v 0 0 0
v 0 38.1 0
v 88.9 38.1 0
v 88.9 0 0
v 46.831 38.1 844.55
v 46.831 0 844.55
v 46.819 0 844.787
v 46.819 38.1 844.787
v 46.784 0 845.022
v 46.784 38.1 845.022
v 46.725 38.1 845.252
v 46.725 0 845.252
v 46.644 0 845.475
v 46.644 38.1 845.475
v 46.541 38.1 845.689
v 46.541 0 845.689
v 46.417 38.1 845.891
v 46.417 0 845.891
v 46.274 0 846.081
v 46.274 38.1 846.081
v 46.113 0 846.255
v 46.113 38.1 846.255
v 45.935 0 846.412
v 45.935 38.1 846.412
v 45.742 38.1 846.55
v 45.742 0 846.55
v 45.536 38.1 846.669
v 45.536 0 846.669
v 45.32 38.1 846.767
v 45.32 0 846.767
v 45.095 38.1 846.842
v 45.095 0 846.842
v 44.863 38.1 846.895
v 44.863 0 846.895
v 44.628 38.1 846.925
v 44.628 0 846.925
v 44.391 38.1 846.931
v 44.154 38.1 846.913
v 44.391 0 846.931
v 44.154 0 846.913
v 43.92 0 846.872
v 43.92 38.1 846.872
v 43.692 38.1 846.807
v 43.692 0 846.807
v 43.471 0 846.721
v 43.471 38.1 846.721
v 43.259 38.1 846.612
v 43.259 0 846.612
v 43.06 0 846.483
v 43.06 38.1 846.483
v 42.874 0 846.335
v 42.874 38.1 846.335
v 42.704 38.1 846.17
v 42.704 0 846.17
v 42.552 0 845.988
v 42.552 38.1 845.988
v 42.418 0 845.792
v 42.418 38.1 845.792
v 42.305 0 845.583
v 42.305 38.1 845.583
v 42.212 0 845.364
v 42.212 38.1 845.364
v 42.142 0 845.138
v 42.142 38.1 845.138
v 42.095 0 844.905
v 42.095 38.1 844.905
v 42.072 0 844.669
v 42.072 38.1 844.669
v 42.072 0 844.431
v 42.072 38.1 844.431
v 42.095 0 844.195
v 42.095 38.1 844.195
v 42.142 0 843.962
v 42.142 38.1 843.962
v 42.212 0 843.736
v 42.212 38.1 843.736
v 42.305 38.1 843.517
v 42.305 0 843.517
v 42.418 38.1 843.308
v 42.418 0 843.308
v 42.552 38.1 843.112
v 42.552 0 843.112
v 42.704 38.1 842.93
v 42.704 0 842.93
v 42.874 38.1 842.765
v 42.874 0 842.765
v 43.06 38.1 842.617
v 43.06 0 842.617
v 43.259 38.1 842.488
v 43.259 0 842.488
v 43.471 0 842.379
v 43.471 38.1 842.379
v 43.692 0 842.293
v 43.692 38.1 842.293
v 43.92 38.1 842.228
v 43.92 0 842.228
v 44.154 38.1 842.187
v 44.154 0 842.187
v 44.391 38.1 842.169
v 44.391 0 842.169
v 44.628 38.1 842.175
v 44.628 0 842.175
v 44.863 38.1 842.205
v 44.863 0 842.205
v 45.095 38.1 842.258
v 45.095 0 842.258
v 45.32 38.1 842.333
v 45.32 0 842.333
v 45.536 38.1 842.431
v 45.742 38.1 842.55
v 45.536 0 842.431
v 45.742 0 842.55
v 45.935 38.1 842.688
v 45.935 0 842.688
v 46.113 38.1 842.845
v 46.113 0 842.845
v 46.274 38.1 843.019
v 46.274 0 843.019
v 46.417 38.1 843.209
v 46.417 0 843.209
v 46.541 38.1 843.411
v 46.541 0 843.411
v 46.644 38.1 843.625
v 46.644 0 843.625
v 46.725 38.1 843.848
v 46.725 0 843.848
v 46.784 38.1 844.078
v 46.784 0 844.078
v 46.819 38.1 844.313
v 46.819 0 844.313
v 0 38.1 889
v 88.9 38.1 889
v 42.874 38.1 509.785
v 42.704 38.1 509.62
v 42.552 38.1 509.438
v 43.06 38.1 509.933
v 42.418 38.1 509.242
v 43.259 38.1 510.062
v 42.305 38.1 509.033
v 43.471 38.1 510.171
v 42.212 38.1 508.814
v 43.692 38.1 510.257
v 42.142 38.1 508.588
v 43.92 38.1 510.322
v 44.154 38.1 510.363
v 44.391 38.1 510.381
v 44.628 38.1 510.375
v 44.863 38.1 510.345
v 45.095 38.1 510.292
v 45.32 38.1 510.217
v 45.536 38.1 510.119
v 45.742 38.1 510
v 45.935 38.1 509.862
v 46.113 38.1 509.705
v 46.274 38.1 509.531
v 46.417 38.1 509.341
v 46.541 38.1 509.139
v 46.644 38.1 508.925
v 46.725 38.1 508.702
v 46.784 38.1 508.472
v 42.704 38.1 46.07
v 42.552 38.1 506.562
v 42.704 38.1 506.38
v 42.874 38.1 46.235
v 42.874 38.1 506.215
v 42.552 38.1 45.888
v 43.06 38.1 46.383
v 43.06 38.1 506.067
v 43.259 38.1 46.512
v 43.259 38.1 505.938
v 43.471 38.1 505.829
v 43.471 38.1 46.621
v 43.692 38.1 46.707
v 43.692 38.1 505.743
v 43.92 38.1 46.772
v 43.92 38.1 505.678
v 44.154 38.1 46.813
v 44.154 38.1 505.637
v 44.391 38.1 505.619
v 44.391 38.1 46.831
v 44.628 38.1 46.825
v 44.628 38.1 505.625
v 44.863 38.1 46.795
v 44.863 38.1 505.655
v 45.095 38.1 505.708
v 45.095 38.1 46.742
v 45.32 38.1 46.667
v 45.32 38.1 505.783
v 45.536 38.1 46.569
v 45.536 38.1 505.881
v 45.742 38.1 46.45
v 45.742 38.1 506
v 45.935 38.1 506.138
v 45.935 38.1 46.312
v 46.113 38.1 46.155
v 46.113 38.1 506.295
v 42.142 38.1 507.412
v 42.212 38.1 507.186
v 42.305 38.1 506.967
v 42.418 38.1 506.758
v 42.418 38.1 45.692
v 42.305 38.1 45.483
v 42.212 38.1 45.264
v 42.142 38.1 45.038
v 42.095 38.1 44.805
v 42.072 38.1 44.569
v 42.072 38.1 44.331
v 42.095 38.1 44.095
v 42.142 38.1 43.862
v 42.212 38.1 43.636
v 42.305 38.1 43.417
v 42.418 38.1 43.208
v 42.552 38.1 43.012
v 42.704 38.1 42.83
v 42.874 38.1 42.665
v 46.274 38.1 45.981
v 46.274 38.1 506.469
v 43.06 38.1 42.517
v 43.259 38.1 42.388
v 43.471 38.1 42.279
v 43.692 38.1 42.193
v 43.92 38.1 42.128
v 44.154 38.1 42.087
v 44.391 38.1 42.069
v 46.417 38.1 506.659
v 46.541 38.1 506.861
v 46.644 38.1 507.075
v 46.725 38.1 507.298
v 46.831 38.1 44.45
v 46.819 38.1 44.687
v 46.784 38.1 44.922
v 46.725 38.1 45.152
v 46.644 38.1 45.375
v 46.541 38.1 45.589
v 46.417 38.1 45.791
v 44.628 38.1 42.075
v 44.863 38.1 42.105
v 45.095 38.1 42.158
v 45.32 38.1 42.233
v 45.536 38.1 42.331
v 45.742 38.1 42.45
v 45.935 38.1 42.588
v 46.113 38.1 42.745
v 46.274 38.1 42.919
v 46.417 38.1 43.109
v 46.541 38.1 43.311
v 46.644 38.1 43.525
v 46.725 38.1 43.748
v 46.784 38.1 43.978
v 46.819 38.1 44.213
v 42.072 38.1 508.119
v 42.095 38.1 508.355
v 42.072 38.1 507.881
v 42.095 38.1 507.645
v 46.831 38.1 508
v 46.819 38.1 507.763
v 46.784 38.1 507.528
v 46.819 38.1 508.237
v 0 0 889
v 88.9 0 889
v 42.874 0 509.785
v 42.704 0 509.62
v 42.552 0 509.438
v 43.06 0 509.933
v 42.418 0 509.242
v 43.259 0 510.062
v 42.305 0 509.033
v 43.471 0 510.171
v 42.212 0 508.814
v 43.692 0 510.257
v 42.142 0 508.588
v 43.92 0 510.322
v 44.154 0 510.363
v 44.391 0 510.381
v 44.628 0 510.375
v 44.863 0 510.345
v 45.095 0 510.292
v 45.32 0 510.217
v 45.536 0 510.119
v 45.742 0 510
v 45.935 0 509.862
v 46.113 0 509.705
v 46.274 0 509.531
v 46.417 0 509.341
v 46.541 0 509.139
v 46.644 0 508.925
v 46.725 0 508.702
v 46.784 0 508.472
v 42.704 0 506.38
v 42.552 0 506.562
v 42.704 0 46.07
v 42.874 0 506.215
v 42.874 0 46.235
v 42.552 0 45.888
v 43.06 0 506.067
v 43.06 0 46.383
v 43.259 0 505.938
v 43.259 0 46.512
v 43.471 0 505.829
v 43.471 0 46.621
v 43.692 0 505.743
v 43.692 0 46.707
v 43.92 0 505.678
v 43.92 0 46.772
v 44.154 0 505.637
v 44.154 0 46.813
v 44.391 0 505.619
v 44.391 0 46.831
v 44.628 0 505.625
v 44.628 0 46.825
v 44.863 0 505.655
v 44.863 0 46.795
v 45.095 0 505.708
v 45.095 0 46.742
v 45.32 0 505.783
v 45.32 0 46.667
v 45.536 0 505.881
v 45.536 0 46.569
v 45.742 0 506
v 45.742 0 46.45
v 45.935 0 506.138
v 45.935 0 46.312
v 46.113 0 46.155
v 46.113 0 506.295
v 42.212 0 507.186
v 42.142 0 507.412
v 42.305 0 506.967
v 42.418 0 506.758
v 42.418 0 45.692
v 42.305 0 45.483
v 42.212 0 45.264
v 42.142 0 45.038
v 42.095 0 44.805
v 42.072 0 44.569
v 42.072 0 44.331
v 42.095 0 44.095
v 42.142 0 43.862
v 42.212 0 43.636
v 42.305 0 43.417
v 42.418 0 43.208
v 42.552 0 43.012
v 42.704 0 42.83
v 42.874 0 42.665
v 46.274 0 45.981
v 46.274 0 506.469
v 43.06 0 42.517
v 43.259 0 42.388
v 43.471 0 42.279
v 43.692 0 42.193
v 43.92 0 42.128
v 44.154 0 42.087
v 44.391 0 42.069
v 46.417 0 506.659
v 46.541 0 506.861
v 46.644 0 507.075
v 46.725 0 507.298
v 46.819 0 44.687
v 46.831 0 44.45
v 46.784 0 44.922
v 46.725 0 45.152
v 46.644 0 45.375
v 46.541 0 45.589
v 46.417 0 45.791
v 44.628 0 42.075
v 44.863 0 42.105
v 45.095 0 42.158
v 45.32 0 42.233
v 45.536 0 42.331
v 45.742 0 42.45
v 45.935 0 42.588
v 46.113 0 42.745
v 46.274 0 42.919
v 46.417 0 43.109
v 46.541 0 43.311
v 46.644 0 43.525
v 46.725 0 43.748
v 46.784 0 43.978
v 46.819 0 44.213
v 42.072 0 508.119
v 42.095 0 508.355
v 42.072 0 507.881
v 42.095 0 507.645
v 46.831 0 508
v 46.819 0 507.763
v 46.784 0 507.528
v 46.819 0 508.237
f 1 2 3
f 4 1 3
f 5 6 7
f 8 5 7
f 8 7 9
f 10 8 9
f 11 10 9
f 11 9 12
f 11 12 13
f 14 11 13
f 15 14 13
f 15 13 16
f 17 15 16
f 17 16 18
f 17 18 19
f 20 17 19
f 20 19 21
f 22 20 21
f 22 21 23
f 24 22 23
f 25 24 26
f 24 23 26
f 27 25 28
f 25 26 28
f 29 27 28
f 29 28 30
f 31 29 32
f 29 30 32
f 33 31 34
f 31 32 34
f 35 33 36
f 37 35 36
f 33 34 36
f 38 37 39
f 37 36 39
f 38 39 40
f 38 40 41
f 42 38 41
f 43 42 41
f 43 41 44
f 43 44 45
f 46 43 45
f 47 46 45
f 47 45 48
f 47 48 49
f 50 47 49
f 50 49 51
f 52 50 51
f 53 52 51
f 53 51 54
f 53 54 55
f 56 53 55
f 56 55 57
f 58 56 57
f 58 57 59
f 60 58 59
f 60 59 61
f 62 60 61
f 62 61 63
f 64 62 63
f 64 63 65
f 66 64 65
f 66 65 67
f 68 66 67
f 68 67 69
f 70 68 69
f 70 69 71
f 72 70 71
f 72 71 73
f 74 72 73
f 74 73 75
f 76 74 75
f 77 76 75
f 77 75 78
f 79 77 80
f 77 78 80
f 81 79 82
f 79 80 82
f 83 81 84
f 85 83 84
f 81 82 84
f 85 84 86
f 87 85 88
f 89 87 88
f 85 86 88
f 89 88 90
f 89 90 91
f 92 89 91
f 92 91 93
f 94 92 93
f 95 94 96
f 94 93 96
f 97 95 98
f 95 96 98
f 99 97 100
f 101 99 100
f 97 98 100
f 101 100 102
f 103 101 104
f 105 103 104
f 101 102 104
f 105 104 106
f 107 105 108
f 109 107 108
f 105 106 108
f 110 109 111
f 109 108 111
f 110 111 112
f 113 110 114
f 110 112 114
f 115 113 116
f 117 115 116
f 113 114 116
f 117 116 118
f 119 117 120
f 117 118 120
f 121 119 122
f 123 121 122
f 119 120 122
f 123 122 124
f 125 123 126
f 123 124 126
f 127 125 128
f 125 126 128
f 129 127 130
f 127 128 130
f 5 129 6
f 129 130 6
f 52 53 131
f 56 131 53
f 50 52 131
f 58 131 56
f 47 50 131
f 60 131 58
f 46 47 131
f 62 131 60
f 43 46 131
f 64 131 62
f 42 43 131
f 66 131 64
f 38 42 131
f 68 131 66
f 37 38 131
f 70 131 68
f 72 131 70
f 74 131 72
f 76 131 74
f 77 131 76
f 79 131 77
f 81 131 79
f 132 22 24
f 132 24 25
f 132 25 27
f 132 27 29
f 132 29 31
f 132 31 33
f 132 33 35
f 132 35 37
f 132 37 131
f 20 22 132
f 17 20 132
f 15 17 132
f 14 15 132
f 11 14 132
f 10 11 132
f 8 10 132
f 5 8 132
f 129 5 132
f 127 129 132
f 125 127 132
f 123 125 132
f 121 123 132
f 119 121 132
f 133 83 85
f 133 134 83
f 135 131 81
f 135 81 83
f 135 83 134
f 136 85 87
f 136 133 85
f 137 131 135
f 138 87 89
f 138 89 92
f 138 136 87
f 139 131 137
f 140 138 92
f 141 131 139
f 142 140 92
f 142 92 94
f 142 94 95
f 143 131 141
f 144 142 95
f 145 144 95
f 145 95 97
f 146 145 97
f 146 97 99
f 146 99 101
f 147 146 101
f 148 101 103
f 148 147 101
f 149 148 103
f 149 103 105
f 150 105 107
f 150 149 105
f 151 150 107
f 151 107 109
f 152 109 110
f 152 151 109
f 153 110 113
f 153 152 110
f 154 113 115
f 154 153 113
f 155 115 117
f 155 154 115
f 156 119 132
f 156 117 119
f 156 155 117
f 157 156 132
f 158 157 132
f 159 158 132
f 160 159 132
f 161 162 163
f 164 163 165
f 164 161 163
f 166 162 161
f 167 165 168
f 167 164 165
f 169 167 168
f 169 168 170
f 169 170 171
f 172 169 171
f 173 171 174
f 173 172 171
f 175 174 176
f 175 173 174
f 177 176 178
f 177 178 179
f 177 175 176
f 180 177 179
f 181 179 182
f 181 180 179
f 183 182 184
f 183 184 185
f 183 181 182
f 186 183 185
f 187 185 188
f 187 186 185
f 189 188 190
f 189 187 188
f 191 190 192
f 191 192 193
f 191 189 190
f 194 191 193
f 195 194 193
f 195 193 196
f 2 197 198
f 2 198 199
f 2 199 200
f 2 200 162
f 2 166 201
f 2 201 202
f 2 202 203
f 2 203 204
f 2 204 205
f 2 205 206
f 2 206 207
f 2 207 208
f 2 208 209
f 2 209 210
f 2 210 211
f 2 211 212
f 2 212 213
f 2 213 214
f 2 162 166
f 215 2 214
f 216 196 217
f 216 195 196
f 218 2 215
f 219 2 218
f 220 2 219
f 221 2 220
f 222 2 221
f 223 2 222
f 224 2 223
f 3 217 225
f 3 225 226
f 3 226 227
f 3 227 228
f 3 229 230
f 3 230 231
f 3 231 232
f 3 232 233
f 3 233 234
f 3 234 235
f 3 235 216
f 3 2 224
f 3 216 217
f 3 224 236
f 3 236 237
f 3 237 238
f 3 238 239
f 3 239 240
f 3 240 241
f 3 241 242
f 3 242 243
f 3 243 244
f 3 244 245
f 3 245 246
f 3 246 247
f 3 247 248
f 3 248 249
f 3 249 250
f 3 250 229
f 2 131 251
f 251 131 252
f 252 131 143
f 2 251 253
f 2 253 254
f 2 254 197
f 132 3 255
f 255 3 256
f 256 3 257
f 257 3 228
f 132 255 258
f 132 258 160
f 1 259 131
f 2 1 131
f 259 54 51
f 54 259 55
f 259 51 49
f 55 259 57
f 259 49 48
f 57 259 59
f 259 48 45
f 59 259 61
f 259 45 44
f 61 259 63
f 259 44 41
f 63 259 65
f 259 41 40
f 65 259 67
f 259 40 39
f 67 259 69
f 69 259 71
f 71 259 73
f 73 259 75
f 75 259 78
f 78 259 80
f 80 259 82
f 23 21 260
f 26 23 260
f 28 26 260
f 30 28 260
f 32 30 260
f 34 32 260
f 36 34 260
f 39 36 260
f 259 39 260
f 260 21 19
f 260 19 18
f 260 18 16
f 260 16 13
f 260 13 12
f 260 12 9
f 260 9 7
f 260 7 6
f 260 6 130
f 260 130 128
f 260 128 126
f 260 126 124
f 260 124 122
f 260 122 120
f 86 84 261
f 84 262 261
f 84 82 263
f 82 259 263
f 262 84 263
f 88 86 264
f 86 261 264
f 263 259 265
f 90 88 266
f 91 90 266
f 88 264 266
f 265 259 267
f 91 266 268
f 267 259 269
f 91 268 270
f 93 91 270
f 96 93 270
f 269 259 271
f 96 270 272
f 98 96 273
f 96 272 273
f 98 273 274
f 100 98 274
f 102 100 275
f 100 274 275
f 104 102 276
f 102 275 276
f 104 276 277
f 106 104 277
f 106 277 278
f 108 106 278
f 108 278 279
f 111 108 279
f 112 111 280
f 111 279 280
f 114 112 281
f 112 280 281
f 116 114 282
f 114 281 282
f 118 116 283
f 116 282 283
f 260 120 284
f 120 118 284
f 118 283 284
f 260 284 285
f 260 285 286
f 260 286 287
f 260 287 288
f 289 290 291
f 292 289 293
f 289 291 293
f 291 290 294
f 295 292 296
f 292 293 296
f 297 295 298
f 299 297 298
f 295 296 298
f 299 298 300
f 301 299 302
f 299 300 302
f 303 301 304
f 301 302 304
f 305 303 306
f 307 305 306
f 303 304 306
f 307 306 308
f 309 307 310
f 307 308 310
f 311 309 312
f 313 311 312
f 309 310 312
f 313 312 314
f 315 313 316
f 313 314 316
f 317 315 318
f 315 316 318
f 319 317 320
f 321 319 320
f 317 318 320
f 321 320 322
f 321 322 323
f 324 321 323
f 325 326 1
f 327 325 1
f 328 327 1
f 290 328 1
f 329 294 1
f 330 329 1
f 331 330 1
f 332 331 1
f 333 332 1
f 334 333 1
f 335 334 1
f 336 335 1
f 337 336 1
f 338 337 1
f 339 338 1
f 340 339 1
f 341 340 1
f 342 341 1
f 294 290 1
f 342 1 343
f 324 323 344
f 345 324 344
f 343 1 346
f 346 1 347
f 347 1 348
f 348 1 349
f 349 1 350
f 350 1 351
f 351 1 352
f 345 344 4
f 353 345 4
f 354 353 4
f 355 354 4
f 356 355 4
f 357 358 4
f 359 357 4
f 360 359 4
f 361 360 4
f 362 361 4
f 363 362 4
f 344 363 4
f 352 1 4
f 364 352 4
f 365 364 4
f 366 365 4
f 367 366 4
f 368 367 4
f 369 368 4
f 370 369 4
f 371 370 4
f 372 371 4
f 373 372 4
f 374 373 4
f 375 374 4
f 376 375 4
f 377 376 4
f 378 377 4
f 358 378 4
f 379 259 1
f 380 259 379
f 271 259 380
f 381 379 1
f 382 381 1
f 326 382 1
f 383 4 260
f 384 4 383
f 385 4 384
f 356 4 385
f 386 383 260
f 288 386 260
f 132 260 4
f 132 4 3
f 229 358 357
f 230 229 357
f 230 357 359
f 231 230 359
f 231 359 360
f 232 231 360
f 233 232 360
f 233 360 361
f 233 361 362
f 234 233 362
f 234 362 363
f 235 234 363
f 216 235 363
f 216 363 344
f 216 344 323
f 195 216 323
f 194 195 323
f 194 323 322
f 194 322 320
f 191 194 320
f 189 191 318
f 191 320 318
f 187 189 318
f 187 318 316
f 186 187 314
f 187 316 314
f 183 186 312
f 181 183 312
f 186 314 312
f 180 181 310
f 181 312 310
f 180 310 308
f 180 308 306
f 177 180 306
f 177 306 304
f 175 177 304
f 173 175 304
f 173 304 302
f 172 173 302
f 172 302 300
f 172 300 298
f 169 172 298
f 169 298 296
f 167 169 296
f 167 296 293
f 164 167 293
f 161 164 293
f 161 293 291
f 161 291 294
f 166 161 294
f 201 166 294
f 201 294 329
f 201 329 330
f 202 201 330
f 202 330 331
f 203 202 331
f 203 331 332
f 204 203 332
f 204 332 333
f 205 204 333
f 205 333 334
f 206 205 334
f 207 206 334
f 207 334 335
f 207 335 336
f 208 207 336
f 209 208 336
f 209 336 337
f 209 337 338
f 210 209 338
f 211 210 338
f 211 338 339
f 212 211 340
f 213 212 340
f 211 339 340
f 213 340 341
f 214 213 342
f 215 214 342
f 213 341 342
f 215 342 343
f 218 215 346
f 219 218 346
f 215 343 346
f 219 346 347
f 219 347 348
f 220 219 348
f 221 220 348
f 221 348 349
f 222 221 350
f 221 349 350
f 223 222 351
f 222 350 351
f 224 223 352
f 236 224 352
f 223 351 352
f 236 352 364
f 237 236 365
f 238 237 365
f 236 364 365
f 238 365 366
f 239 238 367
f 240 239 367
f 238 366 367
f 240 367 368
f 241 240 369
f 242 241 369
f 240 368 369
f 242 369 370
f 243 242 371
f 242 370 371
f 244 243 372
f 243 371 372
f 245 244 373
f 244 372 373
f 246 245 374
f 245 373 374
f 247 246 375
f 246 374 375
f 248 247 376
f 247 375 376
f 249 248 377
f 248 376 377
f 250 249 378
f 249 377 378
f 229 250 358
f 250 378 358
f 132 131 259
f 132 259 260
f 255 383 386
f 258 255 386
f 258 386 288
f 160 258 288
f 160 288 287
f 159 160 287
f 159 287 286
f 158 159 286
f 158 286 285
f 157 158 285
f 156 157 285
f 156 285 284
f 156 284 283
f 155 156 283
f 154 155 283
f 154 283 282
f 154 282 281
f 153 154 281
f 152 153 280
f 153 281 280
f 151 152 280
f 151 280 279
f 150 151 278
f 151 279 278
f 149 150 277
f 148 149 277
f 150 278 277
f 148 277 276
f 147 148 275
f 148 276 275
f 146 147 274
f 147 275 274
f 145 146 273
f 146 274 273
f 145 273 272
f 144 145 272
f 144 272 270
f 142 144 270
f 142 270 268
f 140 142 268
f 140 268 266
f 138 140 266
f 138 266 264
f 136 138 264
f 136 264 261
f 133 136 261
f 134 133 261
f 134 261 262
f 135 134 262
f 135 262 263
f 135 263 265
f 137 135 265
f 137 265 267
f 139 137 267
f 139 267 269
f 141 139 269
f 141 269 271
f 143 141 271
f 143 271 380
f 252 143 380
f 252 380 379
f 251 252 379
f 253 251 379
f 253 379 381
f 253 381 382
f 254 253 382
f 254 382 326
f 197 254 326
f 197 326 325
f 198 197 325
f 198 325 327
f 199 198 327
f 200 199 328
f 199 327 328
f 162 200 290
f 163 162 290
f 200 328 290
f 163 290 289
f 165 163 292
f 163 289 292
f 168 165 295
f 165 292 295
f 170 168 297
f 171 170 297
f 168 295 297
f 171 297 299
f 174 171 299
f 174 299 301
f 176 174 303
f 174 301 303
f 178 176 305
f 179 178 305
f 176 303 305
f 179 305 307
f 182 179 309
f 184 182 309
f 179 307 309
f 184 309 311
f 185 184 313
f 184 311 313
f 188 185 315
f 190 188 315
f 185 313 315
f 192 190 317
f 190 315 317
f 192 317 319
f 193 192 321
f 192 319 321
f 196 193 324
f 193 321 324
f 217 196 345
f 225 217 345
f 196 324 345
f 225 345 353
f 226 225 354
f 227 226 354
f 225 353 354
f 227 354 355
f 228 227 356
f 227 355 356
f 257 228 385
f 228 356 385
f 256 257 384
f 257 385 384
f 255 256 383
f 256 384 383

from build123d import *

# Parameters (mm, degrees)
SKETCH001_AS_DRAWN_R                 = 2.38125
EXTRUDE001_DEPTH                     = 76.2
EXTRUDE001_ONTO_SKETCH001_ROLL_ANGLE = 90
SKETCH_W                             = 88.9
SKETCH_H                             = 38.1
EXTRUDE_DEPTH                        = 889


with BuildPart() as extrude001:
    # Sketch001 as drawn → Extrude001 (new)
    with BuildSketch(Plane.XY):
        with Locations((44.45, 44.45)):
            Circle(SKETCH001_AS_DRAWN_R)
        with Locations((44.45, 844.55)):
            Circle(SKETCH001_AS_DRAWN_R)
        with Locations((44.45, 508)):
            Circle(SKETCH001_AS_DRAWN_R)
    extrude(amount=-EXTRUDE001_DEPTH)


with BuildPart() as extrude001_1:
    # Extrude001 onto Sketch001 roll: moved
    add(extrude001.part.rotate(Axis((0, 0, 0), (1, 0, 0)), EXTRUDE001_ONTO_SKETCH001_ROLL_ANGLE))


with BuildPart() as extrude001_2:
    # Extrude001 onto Sketch001 placement: moved
    add(extrude001_1.part)


with BuildPart() as cut:
    # Sketch → Extrude (new body)
    with BuildSketch(Plane.XY):
        with Locations((44.45, 19.05)):
            Rectangle(SKETCH_W, SKETCH_H)
    extrude(amount=EXTRUDE_DEPTH)

    # Cut: cut Extrude001
    add(extrude001_2.part, mode=Mode.SUBTRACT)


solid = cut.part
